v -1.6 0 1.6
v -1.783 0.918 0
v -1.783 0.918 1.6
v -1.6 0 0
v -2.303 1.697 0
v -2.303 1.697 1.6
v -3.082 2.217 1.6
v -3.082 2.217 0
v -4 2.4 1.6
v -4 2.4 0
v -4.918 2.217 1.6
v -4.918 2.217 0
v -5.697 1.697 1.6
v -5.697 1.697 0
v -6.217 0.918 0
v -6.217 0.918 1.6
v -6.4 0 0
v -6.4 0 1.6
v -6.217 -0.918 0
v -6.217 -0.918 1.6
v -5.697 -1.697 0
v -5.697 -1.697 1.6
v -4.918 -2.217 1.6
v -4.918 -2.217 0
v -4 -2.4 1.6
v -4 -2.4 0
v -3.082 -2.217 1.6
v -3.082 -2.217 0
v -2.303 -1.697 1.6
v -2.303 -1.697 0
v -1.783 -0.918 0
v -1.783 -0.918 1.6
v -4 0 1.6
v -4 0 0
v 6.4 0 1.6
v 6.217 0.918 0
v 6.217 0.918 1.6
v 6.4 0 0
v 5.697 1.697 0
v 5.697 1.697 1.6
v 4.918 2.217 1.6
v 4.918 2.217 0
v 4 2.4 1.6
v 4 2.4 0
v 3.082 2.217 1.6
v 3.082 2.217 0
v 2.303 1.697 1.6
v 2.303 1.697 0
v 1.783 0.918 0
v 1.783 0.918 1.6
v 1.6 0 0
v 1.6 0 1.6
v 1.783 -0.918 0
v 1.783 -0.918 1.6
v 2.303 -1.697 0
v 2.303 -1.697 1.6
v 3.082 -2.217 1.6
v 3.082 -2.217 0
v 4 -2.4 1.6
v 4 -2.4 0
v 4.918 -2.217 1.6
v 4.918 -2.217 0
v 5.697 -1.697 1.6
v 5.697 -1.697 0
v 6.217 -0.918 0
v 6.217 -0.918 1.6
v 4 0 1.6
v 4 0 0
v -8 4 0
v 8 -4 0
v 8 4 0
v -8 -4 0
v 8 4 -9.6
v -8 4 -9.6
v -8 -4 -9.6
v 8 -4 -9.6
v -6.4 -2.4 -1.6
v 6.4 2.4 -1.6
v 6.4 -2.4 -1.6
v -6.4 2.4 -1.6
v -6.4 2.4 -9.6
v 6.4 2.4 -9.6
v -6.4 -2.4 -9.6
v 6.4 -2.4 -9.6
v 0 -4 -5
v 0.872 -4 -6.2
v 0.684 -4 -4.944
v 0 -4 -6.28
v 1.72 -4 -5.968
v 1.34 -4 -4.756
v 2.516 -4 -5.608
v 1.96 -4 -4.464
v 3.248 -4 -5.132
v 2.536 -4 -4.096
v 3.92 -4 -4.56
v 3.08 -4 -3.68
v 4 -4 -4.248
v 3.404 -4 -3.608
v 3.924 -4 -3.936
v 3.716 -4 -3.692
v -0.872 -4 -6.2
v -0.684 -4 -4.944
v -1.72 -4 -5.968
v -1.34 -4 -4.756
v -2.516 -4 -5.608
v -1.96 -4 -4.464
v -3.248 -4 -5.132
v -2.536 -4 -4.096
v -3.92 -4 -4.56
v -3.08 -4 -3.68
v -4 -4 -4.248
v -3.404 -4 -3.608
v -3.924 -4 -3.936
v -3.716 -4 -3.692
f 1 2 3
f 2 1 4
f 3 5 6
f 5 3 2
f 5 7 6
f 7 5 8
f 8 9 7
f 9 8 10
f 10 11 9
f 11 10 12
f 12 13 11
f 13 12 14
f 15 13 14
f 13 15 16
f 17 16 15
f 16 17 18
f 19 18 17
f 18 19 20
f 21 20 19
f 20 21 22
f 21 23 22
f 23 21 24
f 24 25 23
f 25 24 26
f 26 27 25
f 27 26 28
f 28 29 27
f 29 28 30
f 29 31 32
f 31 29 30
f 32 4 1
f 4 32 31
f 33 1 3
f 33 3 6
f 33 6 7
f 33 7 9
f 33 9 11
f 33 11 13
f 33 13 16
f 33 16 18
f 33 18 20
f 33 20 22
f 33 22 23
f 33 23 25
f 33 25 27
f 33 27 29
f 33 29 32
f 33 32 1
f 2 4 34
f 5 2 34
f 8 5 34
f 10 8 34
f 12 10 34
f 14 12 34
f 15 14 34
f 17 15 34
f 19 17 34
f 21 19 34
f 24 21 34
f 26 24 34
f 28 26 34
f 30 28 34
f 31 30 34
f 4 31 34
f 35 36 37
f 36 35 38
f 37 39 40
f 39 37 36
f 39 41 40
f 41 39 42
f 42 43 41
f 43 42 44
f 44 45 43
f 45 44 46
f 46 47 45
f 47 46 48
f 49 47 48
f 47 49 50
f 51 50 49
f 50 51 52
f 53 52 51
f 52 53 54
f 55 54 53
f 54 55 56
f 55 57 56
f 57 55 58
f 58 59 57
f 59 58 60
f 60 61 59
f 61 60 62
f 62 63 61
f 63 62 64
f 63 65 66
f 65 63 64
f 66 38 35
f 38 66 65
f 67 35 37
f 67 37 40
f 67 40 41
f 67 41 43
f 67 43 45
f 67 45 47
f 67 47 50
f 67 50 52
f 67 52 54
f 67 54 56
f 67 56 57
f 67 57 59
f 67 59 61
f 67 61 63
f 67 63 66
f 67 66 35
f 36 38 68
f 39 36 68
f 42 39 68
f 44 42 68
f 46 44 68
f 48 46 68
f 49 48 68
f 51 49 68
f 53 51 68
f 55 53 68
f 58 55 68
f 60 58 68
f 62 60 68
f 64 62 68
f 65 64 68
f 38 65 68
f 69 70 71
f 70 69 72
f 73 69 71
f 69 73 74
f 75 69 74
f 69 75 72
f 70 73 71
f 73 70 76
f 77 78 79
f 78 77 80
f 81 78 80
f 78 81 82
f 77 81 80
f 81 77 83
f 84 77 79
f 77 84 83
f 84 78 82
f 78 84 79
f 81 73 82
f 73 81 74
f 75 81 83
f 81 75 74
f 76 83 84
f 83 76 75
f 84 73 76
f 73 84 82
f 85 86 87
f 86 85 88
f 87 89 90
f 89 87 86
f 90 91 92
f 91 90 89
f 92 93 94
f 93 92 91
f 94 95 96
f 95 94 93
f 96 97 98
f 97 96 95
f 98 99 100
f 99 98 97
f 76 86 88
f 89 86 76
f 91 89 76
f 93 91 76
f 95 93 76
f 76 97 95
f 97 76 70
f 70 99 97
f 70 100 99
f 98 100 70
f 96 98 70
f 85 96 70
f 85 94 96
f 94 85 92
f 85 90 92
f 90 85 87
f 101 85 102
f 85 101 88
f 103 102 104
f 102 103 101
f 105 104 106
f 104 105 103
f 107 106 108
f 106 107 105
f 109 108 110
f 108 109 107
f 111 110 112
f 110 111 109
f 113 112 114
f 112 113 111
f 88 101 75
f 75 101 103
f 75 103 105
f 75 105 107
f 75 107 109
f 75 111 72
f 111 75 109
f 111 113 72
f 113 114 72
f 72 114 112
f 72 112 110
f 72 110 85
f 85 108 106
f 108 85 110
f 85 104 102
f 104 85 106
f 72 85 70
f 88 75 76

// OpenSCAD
// file: ../p/4-4edge.scad
use <../lib.scad>
function ldraw_lib__4_4edge() = [
// 0 Circle 1.0
// 0 Name: 4-4edge.dat
// 0 Author: James Jessiman
// 0 !LDRAW_ORG Primitive UPDATE 2017-01
// 0 !LICENSE Licensed under CC BY 2.0 and CC BY 4.0 : see CAreadme.txt
// 
// 0 BFC CERTIFY CCW
  [0,"BFC","CERTIFY"],
  [0,"BFC","CCW"],
// 
// 0 !HISTORY 1998-12-15 [PTadmin] Official Update 1998-10
// 0 !HISTORY 2005-12-28 [PTadmin] Official Update 2005-01
// 0 !HISTORY 2007-06-24 [PTadmin] Header formatted for Contributor Agreement
// 0 !HISTORY 2008-07-01 [PTadmin] Official Update 2008-01
// 0 !HISTORY 2017-01-15 [Steffen] BFCed
// 0 !HISTORY 2017-12-30 [PTadmin] Official Update 2017-01
// 
// 
// 2 24 1 0 0 0.9239 0 0.3827
  [2,24,1,0,0,0.9239,0,0.3827],
// 2 24 0.9239 0 0.3827 0.7071 0 0.7071
  [2,24,0.9239,0,0.3827,0.7071,0,0.7071],
// 2 24 0.7071 0 0.7071 0.3827 0 0.9239
  [2,24,0.7071,0,0.7071,0.3827,0,0.9239],
// 2 24 0.3827 0 0.9239 0 0 1
  [2,24,0.3827,0,0.9239,0,0,1],
// 2 24 0 0 1 -0.3827 0 0.9239
  [2,24,0,0,1,-0.3827,0,0.9239],
// 2 24 -0.3827 0 0.9239 -0.7071 0 0.7071
  [2,24,-0.3827,0,0.9239,-0.7071,0,0.7071],
// 2 24 -0.7071 0 0.7071 -0.9239 0 0.3827
  [2,24,-0.7071,0,0.7071,-0.9239,0,0.3827],
// 2 24 -0.9239 0 0.3827 -1 0 -0
  [2,24,-0.9239,0,0.3827,-1,0,-0],
// 2 24 -1 0 -0 -0.9239 0 -0.3827
  [2,24,-1,0,-0,-0.9239,0,-0.3827],
// 2 24 -0.9239 0 -0.3827 -0.7071 0 -0.7071
  [2,24,-0.9239,0,-0.3827,-0.7071,0,-0.7071],
// 2 24 -0.7071 0 -0.7071 -0.3827 0 -0.9239
  [2,24,-0.7071,0,-0.7071,-0.3827,0,-0.9239],
// 2 24 -0.3827 0 -0.9239 0 0 -1
  [2,24,-0.3827,0,-0.9239,0,0,-1],
// 2 24 0 0 -1 0.3827 0 -0.9239
  [2,24,0,0,-1,0.3827,0,-0.9239],
// 2 24 0.3827 0 -0.9239 0.7071 0 -0.7071
  [2,24,0.3827,0,-0.9239,0.7071,0,-0.7071],
// 2 24 0.7071 0 -0.7071 0.9239 0 -0.3827
  [2,24,0.7071,0,-0.7071,0.9239,0,-0.3827],
// 2 24 0.9239 0 -0.3827 1 0 0
  [2,24,0.9239,0,-0.3827,1,0,0],
];
module ldraw_lib__4_4edge(step=0, col=false, unit=2/5, alt=false, line=0.2, solid=!$preview)
    makepoly(ldraw_lib__4_4edge(), step=step, col=col, unit=unit, alt=alt, line=line, solid=solid);
ldraw_lib__4_4edge(line=0.2);
// file: ../p/4-4disc.scad
use <../lib.scad>
function ldraw_lib__4_4disc() = [
// 0 Disc 1.0
// 0 Name: 4-4disc.dat
// 0 Author: James Jessiman
// 0 !LDRAW_ORG Primitive UPDATE 2002-02
// 0 !LICENSE Licensed under CC BY 2.0 and CC BY 4.0 : see CAreadme.txt
// 
// 0 BFC CERTIFY CCW
  [0,"BFC","CERTIFY"],
  [0,"BFC","CCW"],
// 
// 0 !HISTORY 1998-12-15 [PTadmin] Official Update 1998-10
// 0 !HISTORY 2002-03-23 [sbliss] Added BFC statement
// 0 !HISTORY 2002-04-25 [PTadmin] Official Update 2002-02
// 0 !HISTORY 2007-06-24 [PTadmin] Header formatted for Contributor Agreement
// 0 !HISTORY 2008-07-01 [PTadmin] Official Update 2008-01
// 
// 
// 3 16 0 0 0 1 0 0 0.9239 0 0.3827
  [3,16,0,0,0,1,0,0,0.9239,0,0.3827],
// 3 16 0 0 0 0.9239 0 0.3827 0.7071 0 0.7071
  [3,16,0,0,0,0.9239,0,0.3827,0.7071,0,0.7071],
// 3 16 0 0 0 0.7071 0 0.7071 0.3827 0 0.9239
  [3,16,0,0,0,0.7071,0,0.7071,0.3827,0,0.9239],
// 3 16 0 0 0 0.3827 0 0.9239 0 0 1
  [3,16,0,0,0,0.3827,0,0.9239,0,0,1],
// 3 16 0 0 0 0 0 1 -0.3827 0 0.9239
  [3,16,0,0,0,0,0,1,-0.3827,0,0.9239],
// 3 16 0 0 0 -0.3827 0 0.9239 -0.7071 0 0.7071
  [3,16,0,0,0,-0.3827,0,0.9239,-0.7071,0,0.7071],
// 3 16 0 0 0 -0.7071 0 0.7071 -0.9239 0 0.3827
  [3,16,0,0,0,-0.7071,0,0.7071,-0.9239,0,0.3827],
// 3 16 0 0 0 -0.9239 0 0.3827 -1 0 -0
  [3,16,0,0,0,-0.9239,0,0.3827,-1,0,-0],
// 3 16 0 0 0 -1 0 -0 -0.9239 0 -0.3827
  [3,16,0,0,0,-1,0,-0,-0.9239,0,-0.3827],
// 3 16 0 0 0 -0.9239 0 -0.3827 -0.7071 0 -0.7071
  [3,16,0,0,0,-0.9239,0,-0.3827,-0.7071,0,-0.7071],
// 3 16 0 0 0 -0.7071 0 -0.7071 -0.3827 0 -0.9239
  [3,16,0,0,0,-0.7071,0,-0.7071,-0.3827,0,-0.9239],
// 3 16 0 0 0 -0.3827 0 -0.9239 0 0 -1
  [3,16,0,0,0,-0.3827,0,-0.9239,0,0,-1],
// 3 16 0 0 0 0 0 -1 0.3827 0 -0.9239
  [3,16,0,0,0,0,0,-1,0.3827,0,-0.9239],
// 3 16 0 0 0 0.3827 0 -0.9239 0.7071 0 -0.7071
  [3,16,0,0,0,0.3827,0,-0.9239,0.7071,0,-0.7071],
// 3 16 0 0 0 0.7071 0 -0.7071 0.9239 0 -0.3827
  [3,16,0,0,0,0.7071,0,-0.7071,0.9239,0,-0.3827],
// 3 16 0 0 0 0.9239 0 -0.3827 1 0 0
  [3,16,0,0,0,0.9239,0,-0.3827,1,0,0],
// 0
];
module ldraw_lib__4_4disc(step=0, col=false, unit=2/5, alt=false, line=0.2, solid=!$preview)
    makepoly(ldraw_lib__4_4disc(), step=step, col=col, unit=unit, alt=alt, line=line, solid=solid);
ldraw_lib__4_4disc(line=0.2);
// file: ../p/4-4cyli.scad
use <../lib.scad>
$fa=1; $fs=0.2;
function ldraw_lib__4_4cyli(realsolid=false) = [
// 0 Cylinder 1.0
// 0 Name: 4-4cyli.dat
// 0 Author: James Jessiman
// 0 !LDRAW_ORG Primitive UPDATE 2005-01
// 0 !LICENSE Licensed under CC BY 2.0 and CC BY 4.0 : see CAreadme.txt
// 
// 0 BFC CERTIFY CCW
  [0,"BFC","CERTIFY"],
  [0,"BFC","CCW"],
// 
// 0 !HISTORY 1998-12-15 [PTadmin] Official Update 1998-10
// 0 !HISTORY 2002-03-23 [sbliss] Added BFC statement; merged headers from files in distributions LDraw 0.27 and Complete.
// 0 !HISTORY 2002-04-25 [PTadmin] Official Update 2002-02
// 0 !HISTORY 2004-12-14 [guyvivan] BFC CCW
// 0 !HISTORY 2005-12-28 [PTadmin] Official Update 2005-01
// 0 !HISTORY 2007-06-24 [PTadmin] Header formatted for Contributor Agreement
// 0 !HISTORY 2008-07-01 [PTadmin] Official Update 2008-01
// 
// 
// 4 16 1 1 0 0.9239 1 0.3827 0.9239 0 0.3827 1 0 0
  [4,16,1,1,0,0.9239,1,0.3827,0.9239,0,0.3827,1,0,0],
// 5 24 1 0 0 1 1 0 0.9239 0 0.3827 0.9239 0 -0.3827
  [5,24,1,0,0,1,1,0,0.9239,0,0.3827,0.9239,0,-0.3827],
// 4 16 0.9239 1 0.3827 0.7071 1 0.7071 0.7071 0 0.7071 0.9239 0 0.3827
  [4,16,0.9239,1,0.3827,0.7071,1,0.7071,0.7071,0,0.7071,0.9239,0,0.3827],
// 5 24 0.9239 0 0.3827 0.9239 1 0.3827 0.7071 0 0.7071 1 0 0
  [5,24,0.9239,0,0.3827,0.9239,1,0.3827,0.7071,0,0.7071,1,0,0],
// 4 16 0.7071 1 0.7071 0.3827 1 0.9239 0.3827 0 0.9239 0.7071 0 0.7071
  [4,16,0.7071,1,0.7071,0.3827,1,0.9239,0.3827,0,0.9239,0.7071,0,0.7071],
// 5 24 0.7071 0 0.7071 0.7071 1 0.7071 0.3827 0 0.9239 0.9239 0 0.3827
  [5,24,0.7071,0,0.7071,0.7071,1,0.7071,0.3827,0,0.9239,0.9239,0,0.3827],
// 4 16 0.3827 1 0.9239 0 1 1 0 0 1 0.3827 0 0.9239
  [4,16,0.3827,1,0.9239,0,1,1,0,0,1,0.3827,0,0.9239],
// 5 24 0.3827 0 0.9239 0.3827 1 0.9239 0 0 1 0.7071 0 0.7071
  [5,24,0.3827,0,0.9239,0.3827,1,0.9239,0,0,1,0.7071,0,0.7071],
// 4 16 0 1 1 -0.3827 1 0.9239 -0.3827 0 0.9239 0 0 1
  [4,16,0,1,1,-0.3827,1,0.9239,-0.3827,0,0.9239,0,0,1],
// 5 24 0 0 1 0 1 1 -0.3827 0 0.9239 0.3827 0 0.9239
  [5,24,0,0,1,0,1,1,-0.3827,0,0.9239,0.3827,0,0.9239],
// 4 16 -0.3827 1 0.9239 -0.7071 1 0.7071 -0.7071 0 0.7071 -0.3827 0 0.9239
  [4,16,-0.3827,1,0.9239,-0.7071,1,0.7071,-0.7071,0,0.7071,-0.3827,0,0.9239],
// 5 24 -0.3827 0 0.9239 -0.3827 1 0.9239 -0.7071 0 0.7071 0 0 1
  [5,24,-0.3827,0,0.9239,-0.3827,1,0.9239,-0.7071,0,0.7071,0,0,1],
// 4 16 -0.7071 1 0.7071 -0.9239 1 0.3827 -0.9239 0 0.3827 -0.7071 0 0.7071
  [4,16,-0.7071,1,0.7071,-0.9239,1,0.3827,-0.9239,0,0.3827,-0.7071,0,0.7071],
// 5 24 -0.7071 0 0.7071 -0.7071 1 0.7071 -0.9239 0 0.3827 -0.3827 0 0.9239
  [5,24,-0.7071,0,0.7071,-0.7071,1,0.7071,-0.9239,0,0.3827,-0.3827,0,0.9239],
// 4 16 -0.9239 1 0.3827 -1 1 0 -1 0 0 -0.9239 0 0.3827
  [4,16,-0.9239,1,0.3827,-1,1,0,-1,0,0,-0.9239,0,0.3827],
// 5 24 -0.9239 0 0.3827 -0.9239 1 0.3827 -1 0 0 -0.7071 0 0.7071
  [5,24,-0.9239,0,0.3827,-0.9239,1,0.3827,-1,0,0,-0.7071,0,0.7071],
// 4 16 -1 1 0 -0.9239 1 -0.3827 -0.9239 0 -0.3827 -1 0 0
  [4,16,-1,1,0,-0.9239,1,-0.3827,-0.9239,0,-0.3827,-1,0,0],
// 5 24 -1 0 0 -1 1 0 -0.9239 0 -0.3827 -0.9239 0 0.3827
  [5,24,-1,0,0,-1,1,0,-0.9239,0,-0.3827,-0.9239,0,0.3827],
// 4 16 -0.9239 1 -0.3827 -0.7071 1 -0.7071 -0.7071 0 -0.7071 -0.9239 0 -0.3827
  [4,16,-0.9239,1,-0.3827,-0.7071,1,-0.7071,-0.7071,0,-0.7071,-0.9239,0,-0.3827],
// 5 24 -0.9239 0 -0.3827 -0.9239 1 -0.3827 -0.7071 0 -0.7071 -1 0 0
  [5,24,-0.9239,0,-0.3827,-0.9239,1,-0.3827,-0.7071,0,-0.7071,-1,0,0],
// 4 16 -0.7071 1 -0.7071 -0.3827 1 -0.9239 -0.3827 0 -0.9239 -0.7071 0 -0.7071
  [4,16,-0.7071,1,-0.7071,-0.3827,1,-0.9239,-0.3827,0,-0.9239,-0.7071,0,-0.7071],
// 5 24 -0.7071 0 -0.7071 -0.7071 1 -0.7071 -0.3827 0 -0.9239 -0.9239 0 -0.3827
  [5,24,-0.7071,0,-0.7071,-0.7071,1,-0.7071,-0.3827,0,-0.9239,-0.9239,0,-0.3827],
// 4 16 -0.3827 1 -0.9239 0 1 -1 0 0 -1 -0.3827 0 -0.9239
  [4,16,-0.3827,1,-0.9239,0,1,-1,0,0,-1,-0.3827,0,-0.9239],
// 5 24 -0.3827 0 -0.9239 -0.3827 1 -0.9239 0 0 -1 -0.7071 0 -0.7071
  [5,24,-0.3827,0,-0.9239,-0.3827,1,-0.9239,0,0,-1,-0.7071,0,-0.7071],
// 4 16 0 1 -1 0.3827 1 -0.9239 0.3827 0 -0.9239 0 0 -1
  [4,16,0,1,-1,0.3827,1,-0.9239,0.3827,0,-0.9239,0,0,-1],
// 5 24 0 0 -1 0 1 -1 0.3827 0 -0.9239 -0.3827 0 -0.9239
  [5,24,0,0,-1,0,1,-1,0.3827,0,-0.9239,-0.3827,0,-0.9239],
// 4 16 0.3827 1 -0.9239 0.7071 1 -0.7071 0.7071 0 -0.7071 0.3827 0 -0.9239
  [4,16,0.3827,1,-0.9239,0.7071,1,-0.7071,0.7071,0,-0.7071,0.3827,0,-0.9239],
// 5 24 0.3827 0 -0.9239 0.3827 1 -0.9239 0.7071 0 -0.7071 0 0 -1
  [5,24,0.3827,0,-0.9239,0.3827,1,-0.9239,0.7071,0,-0.7071,0,0,-1],
// 4 16 0.7071 1 -0.7071 0.9239 1 -0.3827 0.9239 0 -0.3827 0.7071 0 -0.7071
  [4,16,0.7071,1,-0.7071,0.9239,1,-0.3827,0.9239,0,-0.3827,0.7071,0,-0.7071],
// 5 24 0.7071 0 -0.7071 0.7071 1 -0.7071 0.9239 0 -0.3827 0.3827 0 -0.9239
  [5,24,0.7071,0,-0.7071,0.7071,1,-0.7071,0.9239,0,-0.3827,0.3827,0,-0.9239],
// 4 16 0.9239 1 -0.3827 1 1 0 1 0 0 0.9239 0 -0.3827
  [4,16,0.9239,1,-0.3827,1,1,0,1,0,0,0.9239,0,-0.3827],
// 5 24 0.9239 0 -0.3827 0.9239 1 -0.3827 1 0 0 0.7071 0 -0.7071
  [5,24,0.9239,0,-0.3827,0.9239,1,-0.3827,1,0,0,0.7071,0,-0.7071],
// 0
];
module ldraw_lib__4_4cyli(step=0, col=false, unit=2/5, alt=false, line=0.2, solid=!$preview)
    makepoly(ldraw_lib__4_4cyli(solid), step=step, col=col, unit=unit, alt=alt, line=line, solid=solid);
ldraw_lib__4_4cyli(line=0.2);
// file: ../p/stud.scad
use <../lib.scad>
use <4-4cyli.scad>
use <4-4disc.scad>
use <4-4edge.scad>
function ldraw_lib__stud() = [
// 0 Stud
// 0 Name: stud.dat
// 0 Author: James Jessiman
// 0 !LDRAW_ORG Primitive UPDATE 2012-01
// 0 !LICENSE Licensed under CC BY 4.0 : see CAreadme.txt
// 
// 0 BFC CERTIFY CCW
  [0,"BFC","CERTIFY"],
  [0,"BFC","CCW"],
// 
// 0 !HISTORY 2002-04-04 [sbliss] Modified for BFC compliance
// 0 !HISTORY 2002-04-25 [PTadmin] Official Update 2002-02
// 0 !HISTORY 2007-06-24 [PTadmin] Header formatted for Contributor Agreement
// 0 !HISTORY 2008-07-01 [PTadmin] Official Update 2008-01
// 0 !HISTORY 2012-02-16 [Philo] Changed to CCW
// 0 !HISTORY 2012-03-30 [PTadmin] Official Update 2012-01
// 
// 
// 1 16 0 0 0 6 0 0 0 1 0 0 0 6 4-4edge.dat
  [1,16,0,0,0,6,0,0,0,1,0,0,0,6, ldraw_lib__4_4edge()],
// 1 16 0 -4 0 6 0 0 0 1 0 0 0 6 4-4edge.dat
  [1,16,0,-4,0,6,0,0,0,1,0,0,0,6, ldraw_lib__4_4edge()],
// 1 16 0 0 0 6 0 0 0 -4 0 0 0 6 4-4cyli.dat
  [1,16,0,0,0,6,0,0,0,-4,0,0,0,6, ldraw_lib__4_4cyli()],
// 1 16 0 -4 0 6 0 0 0 1 0 0 0 6 4-4disc.dat
  [1,16,0,-4,0,6,0,0,0,1,0,0,0,6, ldraw_lib__4_4disc()],
  [-1,16,0,0,0,6,0,0,0,-1,0,0,0,6, ldraw_lib__4_4disc()],
];
module ldraw_lib__stud(step=0, col=false, unit=2/5, alt=false, line=0.2, solid=!$preview)
    makepoly(ldraw_lib__stud(), step=step, col=col, unit=unit, alt=alt, line=line, solid=solid);
ldraw_lib__stud(line=0.2);
// file: ../p/stug-1x2.scad
use <../lib.scad>
use <stud.scad>
$fa=1; $fs=0.2;
function ldraw_lib__stug_1x2(realsolid=false) = [
// 0 Stud Group  1 x  2
// 0 Name: stug-1x2.dat
// 0 Author: Steffen [Steffen]
// 0 !LDRAW_ORG Primitive UPDATE 2011-01
// 0 !LICENSE Licensed under CC BY 2.0 and CC BY 4.0 : see CAreadme.txt
// 
// 0 BFC CERTIFY CCW
  [0,"BFC","CERTIFY"],
  [0,"BFC","CCW"],
// 
// 0 !HISTORY 2011-07-25 [PTadmin] Official Update 2011-01
// 
// 
// 1 16 -10 0 0 1 0 0 0 1 0 0 0 1 stud.dat
  [1,16,-10,0,0,1,0,0,0,1,0,0,0,1, ldraw_lib__stud(realsolid)],
// 1 16 10 0 0 1 0 0 0 1 0 0 0 1 stud.dat
  [1,16,10,0,0,1,0,0,0,1,0,0,0,1, ldraw_lib__stud(realsolid)],
];
module ldraw_lib__stug_1x2(step=0, col=false, unit=2/5, alt=false, line=0.2, solid=!$preview)
    makepoly(ldraw_lib__stug_1x2(solid), step=step, col=col, unit=unit, alt=alt, line=line, solid=solid);
ldraw_lib__stug_1x2(line=0.2);
// file: ../p/box5.scad
use <../lib.scad>
function ldraw_lib__box5() = [
// 0 Box with 5 Faces and All Edges
// 0 Name: box5.dat
// 0 Author: James Jessiman
// 0 !LDRAW_ORG Primitive UPDATE 2012-01
// 0 !LICENSE Licensed under CC BY 2.0 and CC BY 4.0 : see CAreadme.txt
// 
// 0 BFC CERTIFY CCW
  [0,"BFC","CERTIFY"],
  [0,"BFC","CCW"],
// 
// 0 !HISTORY 2002-04-03 [sbliss] Modified for BFC compliance
// 0 !HISTORY 2002-04-25 [PTadmin] Official Update 2002-02
// 0 !HISTORY 2007-06-24 [PTadmin] Header formatted for Contributor Agreement
// 0 !HISTORY 2008-07-01 [PTadmin] Official Update 2008-01
// 0 !HISTORY 2012-02-16 [Philo] Changed to CCW
// 0 !HISTORY 2012-03-30 [PTadmin] Official Update 2012-01
// 
// 
// 2 24 1 1 1 -1 1 1
  [2,24,1,1,1,-1,1,1],
// 2 24 -1 1 1 -1 1 -1
  [2,24,-1,1,1,-1,1,-1],
// 2 24 -1 1 -1 1 1 -1
  [2,24,-1,1,-1,1,1,-1],
// 2 24 1 1 -1 1 1 1
  [2,24,1,1,-1,1,1,1],
// 2 24 1 0 1 -1 0 1
  [2,24,1,0,1,-1,0,1],
// 2 24 -1 0 1 -1 0 -1
  [2,24,-1,0,1,-1,0,-1],
// 2 24 -1 0 -1 1 0 -1
  [2,24,-1,0,-1,1,0,-1],
// 2 24 1 0 -1 1 0 1
  [2,24,1,0,-1,1,0,1],
// 2 24 1 0 1 1 1 1
  [2,24,1,0,1,1,1,1],
// 2 24 -1 0 1 -1 1 1
  [2,24,-1,0,1,-1,1,1],
// 2 24 1 0 -1 1 1 -1
  [2,24,1,0,-1,1,1,-1],
// 2 24 -1 0 -1 -1 1 -1
  [2,24,-1,0,-1,-1,1,-1],
// 4 16 -1 1 1 1 1 1 1 1 -1 -1 1 -1
  [4,16,-1,1,1,1,1,1,1,1,-1,-1,1,-1],
// 4 16 -1 1 1 -1 0 1 1 0 1 1 1 1
  [4,16,-1,1,1,-1,0,1,1,0,1,1,1,1],
// 4 16 -1 1 -1 -1 0 -1 -1 0 1 -1 1 1
  [4,16,-1,1,-1,-1,0,-1,-1,0,1,-1,1,1],
// 4 16 1 1 -1 1 0 -1 -1 0 -1 -1 1 -1
  [4,16,1,1,-1,1,0,-1,-1,0,-1,-1,1,-1],
// 4 16 1 1 1 1 0 1 1 0 -1 1 1 -1
  [4,16,1,1,1,1,0,1,1,0,-1,1,1,-1],
];
makepoly(ldraw_lib__box5(), line=0.2);
// file: ../p/box4t.scad
use <../lib.scad>
function ldraw_lib__box4t() = [
// 0 Box with 4 Adjacent Faces and All Edges
// 0 Name: box4t.dat
// 0 Author: Tore Eriksson [Tore_Eriksson]
// 0 !LDRAW_ORG Primitive UPDATE 2003-02
// 0 !LICENSE Licensed under CC BY 2.0 and CC BY 4.0 : see CAreadme.txt
// 
// 0 BFC CERTIFY CCW
  [0,"BFC","CERTIFY"],
  [0,"BFC","CCW"],
// 
// 0 !HISTORY 1997-09-29 [PTadmin] Official Update 1997-15
// 0 !HISTORY 2002-08-31 [izanette] Modified with WINDZ for BFC compliance
// 0 !HISTORY 2003-08-01 [PTadmin] Official Update 2003-02
// 0 !HISTORY 2007-06-24 [PTadmin] Header formatted for Contributor Agreement
// 0 !HISTORY 2008-07-01 [PTadmin] Official Update 2008-01
// 
// 
// 2 24 1 1 1 -1 1 1
  [2,24,1,1,1,-1,1,1],
// 2 24 -1 1 1 -1 1 -1
  [2,24,-1,1,1,-1,1,-1],
// 2 24 -1 1 -1 1 1 -1
  [2,24,-1,1,-1,1,1,-1],
// 2 24 1 1 -1 1 1 1
  [2,24,1,1,-1,1,1,1],
// 2 24 1 0 1 -1 0 1
  [2,24,1,0,1,-1,0,1],
// 2 24 -1 0 1 -1 0 -1
  [2,24,-1,0,1,-1,0,-1],
// 2 24 -1 0 -1 1 0 -1
  [2,24,-1,0,-1,1,0,-1],
// 2 24 1 0 -1 1 0 1
  [2,24,1,0,-1,1,0,1],
// 2 24 1 0 1 1 1 1
  [2,24,1,0,1,1,1,1],
// 2 24 -1 0 1 -1 1 1
  [2,24,-1,0,1,-1,1,1],
// 2 24 1 0 -1 1 1 -1
  [2,24,1,0,-1,1,1,-1],
// 2 24 -1 0 -1 -1 1 -1
  [2,24,-1,0,-1,-1,1,-1],
// 4 16 1 1 1 1 1 -1 -1 1 -1 -1 1 1
  [4,16,1,1,1,1,1,-1,-1,1,-1,-1,1,1],
// 4 16 1 1 1 -1 1 1 -1 0 1 1 0 1
  [4,16,1,1,1,-1,1,1,-1,0,1,1,0,1],
// 4 16 -1 1 1 -1 1 -1 -1 0 -1 -1 0 1
  [4,16,-1,1,1,-1,1,-1,-1,0,-1,-1,0,1],
// 0 4 16 -1 1 -1 -1 0 -1 1 0 -1 1 1 -1
// 4 16 1 1 -1 1 1 1 1 0 1 1 0 -1
  [4,16,1,1,-1,1,1,1,1,0,1,1,0,-1],
// 0
];
makepoly(ldraw_lib__box4t(), line=0.2);
// file: s/3065s01.scad
use <../../lib.scad>
use <../../p/box4t.scad>
use <../../p/box5.scad>
use <../../p/stug-1x2.scad>
function ldraw_lib__s__3065s01() = [
// 0 ~Brick  1 x  2 without Centre Stud without Front
// 0 Name: s\3065s01.dat
// 0 Author: Rene Rechthaler [Blechtaler]
// 0 !LDRAW_ORG Subpart UPDATE 2025-06
// 0 !LICENSE Licensed under CC BY 4.0 : see CAreadme.txt
// 
// 0 BFC CERTIFY CCW
  [0,"BFC","CERTIFY"],
  [0,"BFC","CCW"],
// 
// 0 !HISTORY 2025-04-10 [Blechtaler] made from 3065 by James Jessiman
// 0 !HISTORY 2025-06-26 [OrionP] Official Update 2025-06
// 
// 1 16 0 0 0 1 0 0 0 1 0 0 0 1 stug-1x2.dat
  [1,16,0,0,0,1,0,0,0,1,0,0,0,1, ldraw_lib__stug_1x2()],
// 1 16 0 24 0 20 0 0 0 -24 0 0 0 10 box4t.dat
  [1,16,0,24,0,20,0,0,0,-24,0,0,0,10, ldraw_lib__box4t()],
// 0 BFC INVERTNEXT
  [0,"BFC","INVERTNEXT"],
// 1 16 0 24 0 16 0 0 0 -20 0 0 0 6 box5.dat
  [1,16,0,24,0,16,0,0,0,-20,0,0,0,6, ldraw_lib__box5()],
// 4 16 20 24 10 16 24 6 -16 24 6 -20 24 10
  [4,16,20,24,10,16,24,6,-16,24,6,-20,24,10],
// 4 16 -20 24 10 -16 24 6 -16 24 -6 -20 24 -10
  [4,16,-20,24,10,-16,24,6,-16,24,-6,-20,24,-10],
// 4 16 -20 24 -10 -16 24 -6 16 24 -6 20 24 -10
  [4,16,-20,24,-10,-16,24,-6,16,24,-6,20,24,-10],
// 4 16 20 24 -10 16 24 -6 16 24 6 20 24 10
  [4,16,20,24,-10,16,24,-6,16,24,6,20,24,10],
];
module ldraw_lib__s__3065s01(step=0, col=false, unit=2/5, alt=false, line=0.2, solid=!$preview)
    makepoly(ldraw_lib__s__3065s01(), step=step, col=col, unit=unit, alt=alt, line=line, solid=solid);
ldraw_lib__s__3065s01(line=0.2);
// file: s/3004p0gs01.scad
use <../../lib.scad>
function ldraw_lib__s__3004p0gs01() = [
// 0 ~Brick  1 x  2 with Black Smile Pattern Half
// 0 Name: s\3004p0gs01.dat
// 0 Author: Rene Rechthaler [Blechtaler]
// 0 !LDRAW_ORG Subpart UPDATE 2025-06
// 0 !LICENSE Licensed under CC BY 4.0 : see CAreadme.txt
// 
// 0 BFC CERTIFY CCW
  [0,"BFC","CERTIFY"],
  [0,"BFC","CCW"],
// 
// 0 !HISTORY 2025-04-10 [Blechtaler] made from 3004p0g by [Berth], added BFC NOCLIP
// 0 !HISTORY 2025-06-26 [OrionP] Official Update 2025-06
// 
// 0 BFC NOCLIP
  [0,"BFC","NOCLIP"],
// 4 0 2.18 15.5 -10 1.71 12.36 -10 0 12.5 -10 0 15.7 -10
  [4,0,2.18,15.5,-10,1.71,12.36,-10,0,12.5,-10,0,15.7,-10],
// 4 0 2.18 15.5 -10 4.3 14.92 -10 3.35 11.89 -10 1.71 12.36 -10
  [4,0,2.18,15.5,-10,4.3,14.92,-10,3.35,11.89,-10,1.71,12.36,-10],
// 4 0 4.3 14.92 -10 6.29 14.02 -10 4.9 11.16 -10 3.35 11.89 -10
  [4,0,4.3,14.92,-10,6.29,14.02,-10,4.9,11.16,-10,3.35,11.89,-10],
// 4 0 6.29 14.02 -10 8.12 12.83 -10 6.34 10.24 -10 4.9 11.16 -10
  [4,0,6.29,14.02,-10,8.12,12.83,-10,6.34,10.24,-10,4.9,11.16,-10],
// 4 0 7.7 9.2 -10 6.34 10.24 -10 8.12 12.83 -10 9.8 11.4 -10
  [4,0,7.7,9.2,-10,6.34,10.24,-10,8.12,12.83,-10,9.8,11.4,-10],
// 4 0 7.7 9.2 -10 9.8 11.4 -10 10 10.62 -10 8.51 9.02 -10
  [4,0,7.7,9.2,-10,9.8,11.4,-10,10,10.62,-10,8.51,9.02,-10],
// 4 0 9.29 9.23 -10 8.51 9.02 -10 10 10.62 -10 9.81 9.84 -10
  [4,0,9.29,9.23,-10,8.51,9.02,-10,10,10.62,-10,9.81,9.84,-10],
// 0 BFC CLIP
  [0,"BFC","CLIP"],
// 3 16 20 24 -10 2.18 15.5 -10 0 15.7 -10
  [3,16,20,24,-10,2.18,15.5,-10,0,15.7,-10],
// 3 16 4.3 14.92 -10 2.18 15.5 -10 20 24 -10
  [3,16,4.3,14.92,-10,2.18,15.5,-10,20,24,-10],
// 3 16 6.29 14.02 -10 4.3 14.92 -10 20 24 -10
  [3,16,6.29,14.02,-10,4.3,14.92,-10,20,24,-10],
// 3 16 8.12 12.83 -10 6.29 14.02 -10 20 24 -10
  [3,16,8.12,12.83,-10,6.29,14.02,-10,20,24,-10],
// 3 16 9.8 11.4 -10 8.12 12.83 -10 20 24 -10
  [3,16,9.8,11.4,-10,8.12,12.83,-10,20,24,-10],
// 4 16 9.8 11.4 -10 20 24 -10 20 0 -10 10 10.62 -10
  [4,16,9.8,11.4,-10,20,24,-10,20,0,-10,10,10.62,-10],
// 3 16 20 0 -10 9.81 9.84 -10 10 10.62 -10
  [3,16,20,0,-10,9.81,9.84,-10,10,10.62,-10],
// 3 16 20 0 -10 9.29 9.23 -10 9.81 9.84 -10
  [3,16,20,0,-10,9.29,9.23,-10,9.81,9.84,-10],
// 3 16 8.51 9.02 -10 9.29 9.23 -10 20 0 -10
  [3,16,8.51,9.02,-10,9.29,9.23,-10,20,0,-10],
// 3 16 7.7 9.2 -10 8.51 9.02 -10 20 0 -10
  [3,16,7.7,9.2,-10,8.51,9.02,-10,20,0,-10],
// 3 16 0 12.5 -10 7.7 9.2 -10 20 0 -10
  [3,16,0,12.5,-10,7.7,9.2,-10,20,0,-10],
// 4 16 7.7 9.2 -10 0 12.5 -10 4.9 11.16 -10 6.34 10.24 -10
  [4,16,7.7,9.2,-10,0,12.5,-10,4.9,11.16,-10,6.34,10.24,-10],
// 4 16 1.71 12.36 -10 3.35 11.89 -10 4.9 11.16 -10 0 12.5 -10
  [4,16,1.71,12.36,-10,3.35,11.89,-10,4.9,11.16,-10,0,12.5,-10],
];
module ldraw_lib__s__3004p0gs01(step=0, col=false, unit=2/5, alt=false, line=0.2, solid=!$preview)
    makepoly(ldraw_lib__s__3004p0gs01(), step=step, col=col, unit=unit, alt=alt, line=line, solid=solid);
ldraw_lib__s__3004p0gs01(line=0.2);
// main file
use <../lib.scad>
use <s/3004p0gs01.scad>
use <s/3065s01.scad>
function ldraw_lib__3065p06() = [
// 0 Brick  1 x  2 without Centre Stud with Black Smile Pattern
// 0 Name: 3065p06.dat
// 0 Author: Rene Rechthaler [Blechtaler]
// 0 !LDRAW_ORG Part UPDATE 2025-06
// 0 !LICENSE Licensed under CC BY 4.0 : see CAreadme.txt
// 
// 0 BFC CERTIFY CCW
  [0,"BFC","CERTIFY"],
  [0,"BFC","CCW"],
// 
// 0 !KEYWORDS Bricklink 3065pb24, Rebrickable 3065pr0006, Set 11040
// 
// 0 !HISTORY 2025-06-26 [OrionP] Official Update 2025-06
// 
// 1 16 0 0 0 1 0 0 0 1 0 0 0 1 s\3065s01.dat
  [1,16,0,0,0,1,0,0,0,1,0,0,0,1, ldraw_lib__s__3065s01()],
// 1 16 0 0 0 1 0 0 0 1 0 0 0 1 s\3004p0gs01.dat
  [1,16,0,0,0,1,0,0,0,1,0,0,0,1, ldraw_lib__s__3004p0gs01()],
// 1 16 0 0 0 -1 0 0 0 1 0 0 0 1 s\3004p0gs01.dat
  [1,16,0,0,0,-1,0,0,0,1,0,0,0,1, ldraw_lib__s__3004p0gs01()],
// 3 16 -20 0 -10 0 12.5 -10 20 0 -10
  [3,16,-20,0,-10,0,12.5,-10,20,0,-10],
// 3 16 0 15.7 -10 -20 24 -10 20 24 -10
  [3,16,0,15.7,-10,-20,24,-10,20,24,-10],
];
module ldraw_lib__3065p06(step=0, col=false, unit=2/5, alt=false, line=0.2, solid=!$preview)
    makepoly(ldraw_lib__3065p06(), step=step, col=col, unit=unit, alt=alt, line=line, solid=solid);
ldraw_lib__3065p06(line=0.2);
